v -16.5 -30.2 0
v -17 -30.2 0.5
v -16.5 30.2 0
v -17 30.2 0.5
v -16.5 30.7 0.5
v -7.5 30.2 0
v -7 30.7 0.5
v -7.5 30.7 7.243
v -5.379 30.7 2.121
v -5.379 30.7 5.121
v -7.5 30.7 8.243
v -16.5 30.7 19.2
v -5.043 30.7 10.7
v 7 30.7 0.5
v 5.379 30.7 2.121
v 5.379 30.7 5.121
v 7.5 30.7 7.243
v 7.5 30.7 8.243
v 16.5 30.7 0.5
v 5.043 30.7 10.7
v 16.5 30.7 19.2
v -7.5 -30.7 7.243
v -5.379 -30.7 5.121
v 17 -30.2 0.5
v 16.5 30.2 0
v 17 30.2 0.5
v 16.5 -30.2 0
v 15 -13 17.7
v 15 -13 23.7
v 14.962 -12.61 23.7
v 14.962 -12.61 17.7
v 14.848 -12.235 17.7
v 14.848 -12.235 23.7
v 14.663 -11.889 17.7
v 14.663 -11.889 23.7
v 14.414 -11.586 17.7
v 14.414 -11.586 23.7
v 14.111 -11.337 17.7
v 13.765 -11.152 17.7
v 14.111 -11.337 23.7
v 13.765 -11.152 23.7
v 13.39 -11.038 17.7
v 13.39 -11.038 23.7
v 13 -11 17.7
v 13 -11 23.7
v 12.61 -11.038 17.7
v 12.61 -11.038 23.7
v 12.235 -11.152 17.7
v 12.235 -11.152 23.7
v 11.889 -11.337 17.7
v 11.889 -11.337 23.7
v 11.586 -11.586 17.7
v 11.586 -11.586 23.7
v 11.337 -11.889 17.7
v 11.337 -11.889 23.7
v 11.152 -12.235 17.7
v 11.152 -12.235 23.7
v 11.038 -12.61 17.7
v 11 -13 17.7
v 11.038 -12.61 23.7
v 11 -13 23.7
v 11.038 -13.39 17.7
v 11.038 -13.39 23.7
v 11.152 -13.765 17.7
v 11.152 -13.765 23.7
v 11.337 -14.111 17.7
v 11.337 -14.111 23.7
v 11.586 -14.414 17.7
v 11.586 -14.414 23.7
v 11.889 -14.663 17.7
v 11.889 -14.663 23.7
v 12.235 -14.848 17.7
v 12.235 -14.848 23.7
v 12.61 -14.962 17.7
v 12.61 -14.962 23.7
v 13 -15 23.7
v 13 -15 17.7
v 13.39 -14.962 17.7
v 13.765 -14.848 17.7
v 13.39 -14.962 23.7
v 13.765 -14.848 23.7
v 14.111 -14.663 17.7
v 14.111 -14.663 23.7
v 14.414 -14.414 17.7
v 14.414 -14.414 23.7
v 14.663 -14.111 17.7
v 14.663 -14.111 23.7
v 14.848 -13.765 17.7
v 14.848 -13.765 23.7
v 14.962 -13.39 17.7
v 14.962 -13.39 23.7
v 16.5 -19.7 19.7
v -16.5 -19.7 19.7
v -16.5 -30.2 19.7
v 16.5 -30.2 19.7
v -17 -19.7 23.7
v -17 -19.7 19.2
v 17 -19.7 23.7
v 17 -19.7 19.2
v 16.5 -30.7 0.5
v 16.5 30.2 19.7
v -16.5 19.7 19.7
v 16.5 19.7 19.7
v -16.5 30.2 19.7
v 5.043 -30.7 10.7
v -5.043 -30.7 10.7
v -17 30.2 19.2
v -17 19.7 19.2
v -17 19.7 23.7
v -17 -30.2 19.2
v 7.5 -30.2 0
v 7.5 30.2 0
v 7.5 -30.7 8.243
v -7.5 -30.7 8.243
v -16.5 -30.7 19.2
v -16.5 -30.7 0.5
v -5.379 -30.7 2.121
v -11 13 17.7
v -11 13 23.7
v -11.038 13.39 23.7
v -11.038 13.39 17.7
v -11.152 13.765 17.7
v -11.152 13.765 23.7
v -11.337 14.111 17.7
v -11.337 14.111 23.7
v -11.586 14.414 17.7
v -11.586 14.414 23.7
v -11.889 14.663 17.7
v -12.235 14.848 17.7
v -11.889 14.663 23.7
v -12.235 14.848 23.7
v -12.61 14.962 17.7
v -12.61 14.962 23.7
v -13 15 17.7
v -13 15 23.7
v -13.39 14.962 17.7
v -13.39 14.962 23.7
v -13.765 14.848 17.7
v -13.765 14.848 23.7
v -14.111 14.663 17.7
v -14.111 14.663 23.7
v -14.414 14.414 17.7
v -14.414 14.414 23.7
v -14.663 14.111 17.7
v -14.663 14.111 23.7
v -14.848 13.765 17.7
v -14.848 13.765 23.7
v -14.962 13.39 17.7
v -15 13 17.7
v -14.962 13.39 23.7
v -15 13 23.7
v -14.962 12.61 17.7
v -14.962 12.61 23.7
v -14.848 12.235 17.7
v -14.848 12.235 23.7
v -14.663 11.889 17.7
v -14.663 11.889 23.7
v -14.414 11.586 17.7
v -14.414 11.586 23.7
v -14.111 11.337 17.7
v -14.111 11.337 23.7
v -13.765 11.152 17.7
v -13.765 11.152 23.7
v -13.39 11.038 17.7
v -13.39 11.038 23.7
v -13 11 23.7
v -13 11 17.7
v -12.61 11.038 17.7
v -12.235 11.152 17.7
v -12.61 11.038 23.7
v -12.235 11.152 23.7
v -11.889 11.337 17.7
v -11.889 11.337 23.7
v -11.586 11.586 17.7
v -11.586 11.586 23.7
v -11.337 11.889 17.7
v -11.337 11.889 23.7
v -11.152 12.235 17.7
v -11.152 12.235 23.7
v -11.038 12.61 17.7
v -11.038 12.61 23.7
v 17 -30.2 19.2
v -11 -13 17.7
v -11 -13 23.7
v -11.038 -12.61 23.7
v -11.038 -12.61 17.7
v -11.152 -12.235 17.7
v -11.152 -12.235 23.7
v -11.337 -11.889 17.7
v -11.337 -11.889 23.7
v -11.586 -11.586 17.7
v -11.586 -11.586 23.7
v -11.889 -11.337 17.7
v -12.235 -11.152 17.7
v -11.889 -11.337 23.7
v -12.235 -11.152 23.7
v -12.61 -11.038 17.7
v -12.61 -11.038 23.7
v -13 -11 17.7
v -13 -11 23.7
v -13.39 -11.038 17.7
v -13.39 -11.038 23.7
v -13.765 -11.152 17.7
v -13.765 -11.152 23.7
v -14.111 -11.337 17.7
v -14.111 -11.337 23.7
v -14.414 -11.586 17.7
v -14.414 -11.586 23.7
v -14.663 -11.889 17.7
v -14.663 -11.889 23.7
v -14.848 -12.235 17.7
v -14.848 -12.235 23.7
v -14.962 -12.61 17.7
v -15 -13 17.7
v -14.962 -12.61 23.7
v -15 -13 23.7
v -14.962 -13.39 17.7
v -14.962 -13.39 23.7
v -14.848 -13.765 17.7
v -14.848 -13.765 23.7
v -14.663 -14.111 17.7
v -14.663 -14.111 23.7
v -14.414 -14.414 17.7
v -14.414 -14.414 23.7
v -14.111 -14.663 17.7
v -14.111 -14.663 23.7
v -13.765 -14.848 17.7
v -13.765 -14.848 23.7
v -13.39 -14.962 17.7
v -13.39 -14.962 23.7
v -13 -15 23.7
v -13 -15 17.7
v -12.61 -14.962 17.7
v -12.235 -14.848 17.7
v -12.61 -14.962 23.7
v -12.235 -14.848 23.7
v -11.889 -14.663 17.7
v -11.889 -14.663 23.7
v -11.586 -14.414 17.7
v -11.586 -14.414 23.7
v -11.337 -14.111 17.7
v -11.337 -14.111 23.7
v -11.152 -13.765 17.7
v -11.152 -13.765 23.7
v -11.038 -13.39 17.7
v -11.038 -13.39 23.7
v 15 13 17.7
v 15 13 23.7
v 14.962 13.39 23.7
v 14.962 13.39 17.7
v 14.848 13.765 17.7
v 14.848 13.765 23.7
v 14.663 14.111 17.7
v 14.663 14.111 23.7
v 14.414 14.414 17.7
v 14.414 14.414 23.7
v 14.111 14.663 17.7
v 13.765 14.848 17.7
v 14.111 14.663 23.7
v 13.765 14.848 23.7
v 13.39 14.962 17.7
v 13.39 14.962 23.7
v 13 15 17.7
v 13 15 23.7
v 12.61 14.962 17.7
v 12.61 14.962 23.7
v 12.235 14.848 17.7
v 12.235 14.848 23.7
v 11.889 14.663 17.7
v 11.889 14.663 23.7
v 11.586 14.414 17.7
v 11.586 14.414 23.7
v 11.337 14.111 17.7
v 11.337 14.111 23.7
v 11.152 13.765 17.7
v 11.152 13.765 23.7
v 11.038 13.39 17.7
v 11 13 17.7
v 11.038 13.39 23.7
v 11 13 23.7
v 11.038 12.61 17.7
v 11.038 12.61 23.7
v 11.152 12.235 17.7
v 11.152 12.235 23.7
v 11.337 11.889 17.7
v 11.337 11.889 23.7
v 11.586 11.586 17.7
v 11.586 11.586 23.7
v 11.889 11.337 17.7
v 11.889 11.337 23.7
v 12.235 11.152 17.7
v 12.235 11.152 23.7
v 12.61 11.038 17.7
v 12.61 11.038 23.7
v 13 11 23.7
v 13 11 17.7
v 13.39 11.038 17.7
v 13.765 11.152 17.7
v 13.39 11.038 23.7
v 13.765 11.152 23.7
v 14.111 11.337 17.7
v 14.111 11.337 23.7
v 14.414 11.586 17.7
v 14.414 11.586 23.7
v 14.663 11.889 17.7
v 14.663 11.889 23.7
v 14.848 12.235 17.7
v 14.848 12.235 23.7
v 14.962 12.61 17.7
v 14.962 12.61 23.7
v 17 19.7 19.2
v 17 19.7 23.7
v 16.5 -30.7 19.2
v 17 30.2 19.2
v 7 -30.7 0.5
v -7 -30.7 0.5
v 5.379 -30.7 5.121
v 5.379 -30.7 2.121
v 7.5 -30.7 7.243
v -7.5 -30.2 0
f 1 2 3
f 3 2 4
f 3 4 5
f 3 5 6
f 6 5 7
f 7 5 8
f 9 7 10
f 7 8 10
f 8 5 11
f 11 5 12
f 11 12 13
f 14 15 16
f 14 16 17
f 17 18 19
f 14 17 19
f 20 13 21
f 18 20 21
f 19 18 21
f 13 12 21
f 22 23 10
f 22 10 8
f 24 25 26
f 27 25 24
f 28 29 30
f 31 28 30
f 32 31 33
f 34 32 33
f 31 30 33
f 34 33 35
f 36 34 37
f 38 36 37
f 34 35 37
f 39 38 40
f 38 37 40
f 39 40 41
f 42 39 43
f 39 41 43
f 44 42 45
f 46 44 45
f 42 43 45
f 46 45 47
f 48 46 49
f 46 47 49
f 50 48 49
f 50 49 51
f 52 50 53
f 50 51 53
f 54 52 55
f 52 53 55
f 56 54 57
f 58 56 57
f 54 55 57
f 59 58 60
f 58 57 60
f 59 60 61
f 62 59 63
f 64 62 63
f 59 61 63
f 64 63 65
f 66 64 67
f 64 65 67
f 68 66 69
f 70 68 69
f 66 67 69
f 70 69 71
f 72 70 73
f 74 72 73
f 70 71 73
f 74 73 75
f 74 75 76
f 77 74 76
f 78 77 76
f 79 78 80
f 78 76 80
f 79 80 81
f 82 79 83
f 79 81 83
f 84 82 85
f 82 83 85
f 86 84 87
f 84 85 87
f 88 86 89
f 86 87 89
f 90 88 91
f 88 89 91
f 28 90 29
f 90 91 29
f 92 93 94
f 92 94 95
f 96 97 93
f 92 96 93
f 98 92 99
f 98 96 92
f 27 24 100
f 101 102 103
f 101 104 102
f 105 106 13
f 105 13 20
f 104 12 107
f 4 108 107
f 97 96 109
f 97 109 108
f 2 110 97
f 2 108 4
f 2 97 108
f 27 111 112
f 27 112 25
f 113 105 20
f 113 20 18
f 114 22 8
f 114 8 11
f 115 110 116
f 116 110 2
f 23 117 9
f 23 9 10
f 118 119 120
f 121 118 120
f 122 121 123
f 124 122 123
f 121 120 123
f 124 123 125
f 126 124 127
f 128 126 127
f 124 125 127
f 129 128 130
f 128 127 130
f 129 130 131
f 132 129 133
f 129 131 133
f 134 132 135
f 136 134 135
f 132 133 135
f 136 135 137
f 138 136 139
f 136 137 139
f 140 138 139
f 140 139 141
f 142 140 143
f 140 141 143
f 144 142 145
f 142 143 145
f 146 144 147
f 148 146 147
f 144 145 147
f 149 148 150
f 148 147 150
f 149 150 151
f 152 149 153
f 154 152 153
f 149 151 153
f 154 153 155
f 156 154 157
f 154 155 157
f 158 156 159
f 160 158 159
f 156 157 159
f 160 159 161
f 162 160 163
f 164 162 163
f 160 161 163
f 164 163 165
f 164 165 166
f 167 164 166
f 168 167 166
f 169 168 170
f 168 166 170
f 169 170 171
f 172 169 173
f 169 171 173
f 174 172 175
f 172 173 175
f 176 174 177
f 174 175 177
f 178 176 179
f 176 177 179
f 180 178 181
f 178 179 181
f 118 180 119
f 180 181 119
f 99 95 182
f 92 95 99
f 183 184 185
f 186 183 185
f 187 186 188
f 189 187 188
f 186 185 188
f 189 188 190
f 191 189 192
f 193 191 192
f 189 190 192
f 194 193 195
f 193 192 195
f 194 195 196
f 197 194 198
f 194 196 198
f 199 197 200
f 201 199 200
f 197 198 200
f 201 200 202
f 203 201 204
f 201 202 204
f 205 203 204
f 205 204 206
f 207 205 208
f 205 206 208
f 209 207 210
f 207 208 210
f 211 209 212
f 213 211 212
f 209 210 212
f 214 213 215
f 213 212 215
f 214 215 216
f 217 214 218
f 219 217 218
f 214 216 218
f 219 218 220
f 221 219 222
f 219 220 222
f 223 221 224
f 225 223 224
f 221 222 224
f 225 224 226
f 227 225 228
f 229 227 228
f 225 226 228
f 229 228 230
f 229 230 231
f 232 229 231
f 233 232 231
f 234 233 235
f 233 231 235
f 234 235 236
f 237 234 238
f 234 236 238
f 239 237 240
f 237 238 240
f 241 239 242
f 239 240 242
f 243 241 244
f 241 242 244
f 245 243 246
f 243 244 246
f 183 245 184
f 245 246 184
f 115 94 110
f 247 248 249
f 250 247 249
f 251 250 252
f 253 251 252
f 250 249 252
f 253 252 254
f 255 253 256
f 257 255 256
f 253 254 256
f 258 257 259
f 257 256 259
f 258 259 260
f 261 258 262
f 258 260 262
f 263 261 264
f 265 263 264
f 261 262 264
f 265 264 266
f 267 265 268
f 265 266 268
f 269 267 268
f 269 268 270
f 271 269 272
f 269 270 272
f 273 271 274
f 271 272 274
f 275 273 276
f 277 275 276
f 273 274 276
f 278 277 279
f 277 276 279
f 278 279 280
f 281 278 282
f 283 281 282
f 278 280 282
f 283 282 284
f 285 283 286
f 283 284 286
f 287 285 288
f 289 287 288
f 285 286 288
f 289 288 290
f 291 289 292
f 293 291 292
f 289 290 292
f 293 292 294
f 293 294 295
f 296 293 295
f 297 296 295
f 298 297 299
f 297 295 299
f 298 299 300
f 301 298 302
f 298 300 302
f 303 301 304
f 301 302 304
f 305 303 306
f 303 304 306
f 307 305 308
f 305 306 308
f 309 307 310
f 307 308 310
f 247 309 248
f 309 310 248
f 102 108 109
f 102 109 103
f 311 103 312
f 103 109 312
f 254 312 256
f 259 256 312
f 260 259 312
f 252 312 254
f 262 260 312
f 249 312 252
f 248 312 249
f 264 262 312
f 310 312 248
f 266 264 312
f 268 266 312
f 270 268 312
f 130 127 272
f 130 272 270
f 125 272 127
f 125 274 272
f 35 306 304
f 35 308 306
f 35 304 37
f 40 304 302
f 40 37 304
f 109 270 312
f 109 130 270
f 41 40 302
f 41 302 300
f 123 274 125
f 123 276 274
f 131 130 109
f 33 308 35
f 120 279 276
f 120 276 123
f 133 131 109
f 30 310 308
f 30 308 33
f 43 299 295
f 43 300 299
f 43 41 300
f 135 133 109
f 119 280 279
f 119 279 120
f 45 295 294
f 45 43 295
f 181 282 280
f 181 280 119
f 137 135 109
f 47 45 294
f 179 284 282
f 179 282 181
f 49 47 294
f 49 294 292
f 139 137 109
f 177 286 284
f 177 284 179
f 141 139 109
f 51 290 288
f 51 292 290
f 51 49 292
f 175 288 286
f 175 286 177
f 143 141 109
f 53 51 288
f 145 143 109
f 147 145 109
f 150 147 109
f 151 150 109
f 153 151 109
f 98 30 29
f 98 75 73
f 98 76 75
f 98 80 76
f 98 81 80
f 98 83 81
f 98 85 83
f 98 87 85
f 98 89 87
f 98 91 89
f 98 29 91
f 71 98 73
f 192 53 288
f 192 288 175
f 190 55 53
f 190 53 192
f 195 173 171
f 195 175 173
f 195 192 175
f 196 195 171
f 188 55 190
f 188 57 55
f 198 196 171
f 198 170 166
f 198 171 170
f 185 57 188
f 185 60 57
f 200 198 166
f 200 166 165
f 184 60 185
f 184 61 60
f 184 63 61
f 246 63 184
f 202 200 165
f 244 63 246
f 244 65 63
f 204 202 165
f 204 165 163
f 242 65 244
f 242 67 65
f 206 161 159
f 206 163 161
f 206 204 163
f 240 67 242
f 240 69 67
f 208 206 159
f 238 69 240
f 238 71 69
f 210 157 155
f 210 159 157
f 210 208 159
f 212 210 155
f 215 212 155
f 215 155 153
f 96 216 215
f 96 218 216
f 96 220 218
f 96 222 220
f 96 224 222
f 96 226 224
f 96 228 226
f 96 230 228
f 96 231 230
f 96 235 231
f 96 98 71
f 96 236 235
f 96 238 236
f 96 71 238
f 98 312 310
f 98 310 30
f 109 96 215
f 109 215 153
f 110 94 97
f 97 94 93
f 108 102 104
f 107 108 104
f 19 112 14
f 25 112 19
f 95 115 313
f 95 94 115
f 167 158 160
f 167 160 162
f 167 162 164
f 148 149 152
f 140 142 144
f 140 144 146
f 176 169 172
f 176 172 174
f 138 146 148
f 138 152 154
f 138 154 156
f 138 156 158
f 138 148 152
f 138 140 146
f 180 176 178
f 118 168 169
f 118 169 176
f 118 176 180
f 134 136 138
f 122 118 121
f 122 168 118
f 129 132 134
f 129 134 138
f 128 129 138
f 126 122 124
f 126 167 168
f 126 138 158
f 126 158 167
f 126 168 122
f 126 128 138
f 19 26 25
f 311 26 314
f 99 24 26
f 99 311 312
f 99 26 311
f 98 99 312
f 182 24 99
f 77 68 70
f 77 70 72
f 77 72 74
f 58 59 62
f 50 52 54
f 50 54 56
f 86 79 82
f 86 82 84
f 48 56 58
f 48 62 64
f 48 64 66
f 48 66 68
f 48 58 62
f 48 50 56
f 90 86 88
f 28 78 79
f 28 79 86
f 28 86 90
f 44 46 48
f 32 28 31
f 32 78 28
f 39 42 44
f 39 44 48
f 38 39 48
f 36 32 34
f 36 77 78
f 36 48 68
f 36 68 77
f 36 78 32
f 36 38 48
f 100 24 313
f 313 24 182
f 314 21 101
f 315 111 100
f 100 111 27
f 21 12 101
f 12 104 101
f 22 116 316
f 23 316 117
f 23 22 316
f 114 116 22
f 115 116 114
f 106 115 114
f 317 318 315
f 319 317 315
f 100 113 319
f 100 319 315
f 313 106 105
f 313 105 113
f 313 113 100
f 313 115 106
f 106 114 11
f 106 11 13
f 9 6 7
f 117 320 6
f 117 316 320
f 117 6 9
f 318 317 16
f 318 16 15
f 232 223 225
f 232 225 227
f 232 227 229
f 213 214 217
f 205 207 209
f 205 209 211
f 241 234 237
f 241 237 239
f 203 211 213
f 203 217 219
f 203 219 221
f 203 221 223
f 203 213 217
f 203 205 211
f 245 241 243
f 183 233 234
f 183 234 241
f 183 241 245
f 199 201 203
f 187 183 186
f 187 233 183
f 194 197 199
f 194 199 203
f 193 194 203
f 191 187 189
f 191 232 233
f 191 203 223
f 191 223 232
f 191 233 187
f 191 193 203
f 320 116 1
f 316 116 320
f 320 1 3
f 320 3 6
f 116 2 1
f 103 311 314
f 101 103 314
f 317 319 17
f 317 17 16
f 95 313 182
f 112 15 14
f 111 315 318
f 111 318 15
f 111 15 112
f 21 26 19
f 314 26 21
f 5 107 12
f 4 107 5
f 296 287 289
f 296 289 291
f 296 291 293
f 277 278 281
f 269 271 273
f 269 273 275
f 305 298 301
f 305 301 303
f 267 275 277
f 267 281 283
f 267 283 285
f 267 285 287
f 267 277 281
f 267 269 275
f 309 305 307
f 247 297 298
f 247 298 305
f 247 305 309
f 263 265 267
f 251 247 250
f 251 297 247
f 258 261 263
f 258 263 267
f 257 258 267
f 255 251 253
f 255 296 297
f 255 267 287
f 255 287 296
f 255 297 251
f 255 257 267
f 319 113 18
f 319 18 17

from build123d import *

# Parameters (mm, degrees)
F1_DEPTH = 30.7
F2_R     = 2
F3_DEPTH = 6
F2_W     = 34
F2_H     = 11
F4_DEPTH = 4
F5_SIZE  = 0.5


with BuildPart() as f1:
    # F0 (on Front) → F1 (new body, symmetric)
    with BuildSketch(Plane.XZ):
        Polygon((-17, 0), (-7.5, 0), (-5.3786796564, 2.1213203436), (-5.3786796564, 5.1213203436), (-7.5, 7.2426406871), (-7.5, 8.2426406871), (-5.0426406871, 10.7), (5.0426406871, 10.7), (7.5, 8.2426406871), (7.5, 7.2426406871), (5.3786796564, 5.1213203436), (5.3786796564, 2.1213203436), (7.5, 0), (17, 0), (17, 23.7), (-17, 23.7), align=None)
    extrude(amount=F1_DEPTH, both=True)

    # F2 (on face) → F3 (cut)
    with BuildSketch(Plane.XY.offset(23.7)):
        with Locations((-13, 13)):
            Circle(F2_R)
        with Locations((13, 13)):
            Circle(F2_R)
        with Locations((13, -13)):
            Circle(F2_R)
        with Locations((-13, -13)):
            Circle(F2_R)
    extrude(amount=-F3_DEPTH, mode=Mode.SUBTRACT)

    # F2 (on face) → F4 (cut)
    with BuildSketch(Plane.XY.offset(23.7)):
        with Locations((0, 25.2)):
            Rectangle(F2_W, F2_H)
        with Locations((0, -25.2)):
            Rectangle(F2_W, F2_H)
    extrude(amount=-F4_DEPTH, mode=Mode.SUBTRACT)

    # F5
    f5_edges = [f1.edges().sort_by_distance(p)[0] for p in [
        (17, 0, 0),
        (-17, 0, 0),
        (0, -30.7, 19.7),
        (-17, -25.2, 19.7),
        (17, -30.7, 9.85),
        (-17, -30.7, 9.85),
        (0, 30.7, 19.7),
        (17, 30.7, 9.85),
        (-17, 30.7, 9.85),
        (12.25, 30.7, 0),
        (-12.25, 30.7, 0),
        (-12.25, -30.7, 0),
        (12.25, -30.7, 0),
        (17, -25.2, 19.7),
        (-17, 25.2, 19.7),
        (17, 25.2, 19.7),
    ]]
    chamfer(f5_edges, length=F5_SIZE)


solid = f1.part
